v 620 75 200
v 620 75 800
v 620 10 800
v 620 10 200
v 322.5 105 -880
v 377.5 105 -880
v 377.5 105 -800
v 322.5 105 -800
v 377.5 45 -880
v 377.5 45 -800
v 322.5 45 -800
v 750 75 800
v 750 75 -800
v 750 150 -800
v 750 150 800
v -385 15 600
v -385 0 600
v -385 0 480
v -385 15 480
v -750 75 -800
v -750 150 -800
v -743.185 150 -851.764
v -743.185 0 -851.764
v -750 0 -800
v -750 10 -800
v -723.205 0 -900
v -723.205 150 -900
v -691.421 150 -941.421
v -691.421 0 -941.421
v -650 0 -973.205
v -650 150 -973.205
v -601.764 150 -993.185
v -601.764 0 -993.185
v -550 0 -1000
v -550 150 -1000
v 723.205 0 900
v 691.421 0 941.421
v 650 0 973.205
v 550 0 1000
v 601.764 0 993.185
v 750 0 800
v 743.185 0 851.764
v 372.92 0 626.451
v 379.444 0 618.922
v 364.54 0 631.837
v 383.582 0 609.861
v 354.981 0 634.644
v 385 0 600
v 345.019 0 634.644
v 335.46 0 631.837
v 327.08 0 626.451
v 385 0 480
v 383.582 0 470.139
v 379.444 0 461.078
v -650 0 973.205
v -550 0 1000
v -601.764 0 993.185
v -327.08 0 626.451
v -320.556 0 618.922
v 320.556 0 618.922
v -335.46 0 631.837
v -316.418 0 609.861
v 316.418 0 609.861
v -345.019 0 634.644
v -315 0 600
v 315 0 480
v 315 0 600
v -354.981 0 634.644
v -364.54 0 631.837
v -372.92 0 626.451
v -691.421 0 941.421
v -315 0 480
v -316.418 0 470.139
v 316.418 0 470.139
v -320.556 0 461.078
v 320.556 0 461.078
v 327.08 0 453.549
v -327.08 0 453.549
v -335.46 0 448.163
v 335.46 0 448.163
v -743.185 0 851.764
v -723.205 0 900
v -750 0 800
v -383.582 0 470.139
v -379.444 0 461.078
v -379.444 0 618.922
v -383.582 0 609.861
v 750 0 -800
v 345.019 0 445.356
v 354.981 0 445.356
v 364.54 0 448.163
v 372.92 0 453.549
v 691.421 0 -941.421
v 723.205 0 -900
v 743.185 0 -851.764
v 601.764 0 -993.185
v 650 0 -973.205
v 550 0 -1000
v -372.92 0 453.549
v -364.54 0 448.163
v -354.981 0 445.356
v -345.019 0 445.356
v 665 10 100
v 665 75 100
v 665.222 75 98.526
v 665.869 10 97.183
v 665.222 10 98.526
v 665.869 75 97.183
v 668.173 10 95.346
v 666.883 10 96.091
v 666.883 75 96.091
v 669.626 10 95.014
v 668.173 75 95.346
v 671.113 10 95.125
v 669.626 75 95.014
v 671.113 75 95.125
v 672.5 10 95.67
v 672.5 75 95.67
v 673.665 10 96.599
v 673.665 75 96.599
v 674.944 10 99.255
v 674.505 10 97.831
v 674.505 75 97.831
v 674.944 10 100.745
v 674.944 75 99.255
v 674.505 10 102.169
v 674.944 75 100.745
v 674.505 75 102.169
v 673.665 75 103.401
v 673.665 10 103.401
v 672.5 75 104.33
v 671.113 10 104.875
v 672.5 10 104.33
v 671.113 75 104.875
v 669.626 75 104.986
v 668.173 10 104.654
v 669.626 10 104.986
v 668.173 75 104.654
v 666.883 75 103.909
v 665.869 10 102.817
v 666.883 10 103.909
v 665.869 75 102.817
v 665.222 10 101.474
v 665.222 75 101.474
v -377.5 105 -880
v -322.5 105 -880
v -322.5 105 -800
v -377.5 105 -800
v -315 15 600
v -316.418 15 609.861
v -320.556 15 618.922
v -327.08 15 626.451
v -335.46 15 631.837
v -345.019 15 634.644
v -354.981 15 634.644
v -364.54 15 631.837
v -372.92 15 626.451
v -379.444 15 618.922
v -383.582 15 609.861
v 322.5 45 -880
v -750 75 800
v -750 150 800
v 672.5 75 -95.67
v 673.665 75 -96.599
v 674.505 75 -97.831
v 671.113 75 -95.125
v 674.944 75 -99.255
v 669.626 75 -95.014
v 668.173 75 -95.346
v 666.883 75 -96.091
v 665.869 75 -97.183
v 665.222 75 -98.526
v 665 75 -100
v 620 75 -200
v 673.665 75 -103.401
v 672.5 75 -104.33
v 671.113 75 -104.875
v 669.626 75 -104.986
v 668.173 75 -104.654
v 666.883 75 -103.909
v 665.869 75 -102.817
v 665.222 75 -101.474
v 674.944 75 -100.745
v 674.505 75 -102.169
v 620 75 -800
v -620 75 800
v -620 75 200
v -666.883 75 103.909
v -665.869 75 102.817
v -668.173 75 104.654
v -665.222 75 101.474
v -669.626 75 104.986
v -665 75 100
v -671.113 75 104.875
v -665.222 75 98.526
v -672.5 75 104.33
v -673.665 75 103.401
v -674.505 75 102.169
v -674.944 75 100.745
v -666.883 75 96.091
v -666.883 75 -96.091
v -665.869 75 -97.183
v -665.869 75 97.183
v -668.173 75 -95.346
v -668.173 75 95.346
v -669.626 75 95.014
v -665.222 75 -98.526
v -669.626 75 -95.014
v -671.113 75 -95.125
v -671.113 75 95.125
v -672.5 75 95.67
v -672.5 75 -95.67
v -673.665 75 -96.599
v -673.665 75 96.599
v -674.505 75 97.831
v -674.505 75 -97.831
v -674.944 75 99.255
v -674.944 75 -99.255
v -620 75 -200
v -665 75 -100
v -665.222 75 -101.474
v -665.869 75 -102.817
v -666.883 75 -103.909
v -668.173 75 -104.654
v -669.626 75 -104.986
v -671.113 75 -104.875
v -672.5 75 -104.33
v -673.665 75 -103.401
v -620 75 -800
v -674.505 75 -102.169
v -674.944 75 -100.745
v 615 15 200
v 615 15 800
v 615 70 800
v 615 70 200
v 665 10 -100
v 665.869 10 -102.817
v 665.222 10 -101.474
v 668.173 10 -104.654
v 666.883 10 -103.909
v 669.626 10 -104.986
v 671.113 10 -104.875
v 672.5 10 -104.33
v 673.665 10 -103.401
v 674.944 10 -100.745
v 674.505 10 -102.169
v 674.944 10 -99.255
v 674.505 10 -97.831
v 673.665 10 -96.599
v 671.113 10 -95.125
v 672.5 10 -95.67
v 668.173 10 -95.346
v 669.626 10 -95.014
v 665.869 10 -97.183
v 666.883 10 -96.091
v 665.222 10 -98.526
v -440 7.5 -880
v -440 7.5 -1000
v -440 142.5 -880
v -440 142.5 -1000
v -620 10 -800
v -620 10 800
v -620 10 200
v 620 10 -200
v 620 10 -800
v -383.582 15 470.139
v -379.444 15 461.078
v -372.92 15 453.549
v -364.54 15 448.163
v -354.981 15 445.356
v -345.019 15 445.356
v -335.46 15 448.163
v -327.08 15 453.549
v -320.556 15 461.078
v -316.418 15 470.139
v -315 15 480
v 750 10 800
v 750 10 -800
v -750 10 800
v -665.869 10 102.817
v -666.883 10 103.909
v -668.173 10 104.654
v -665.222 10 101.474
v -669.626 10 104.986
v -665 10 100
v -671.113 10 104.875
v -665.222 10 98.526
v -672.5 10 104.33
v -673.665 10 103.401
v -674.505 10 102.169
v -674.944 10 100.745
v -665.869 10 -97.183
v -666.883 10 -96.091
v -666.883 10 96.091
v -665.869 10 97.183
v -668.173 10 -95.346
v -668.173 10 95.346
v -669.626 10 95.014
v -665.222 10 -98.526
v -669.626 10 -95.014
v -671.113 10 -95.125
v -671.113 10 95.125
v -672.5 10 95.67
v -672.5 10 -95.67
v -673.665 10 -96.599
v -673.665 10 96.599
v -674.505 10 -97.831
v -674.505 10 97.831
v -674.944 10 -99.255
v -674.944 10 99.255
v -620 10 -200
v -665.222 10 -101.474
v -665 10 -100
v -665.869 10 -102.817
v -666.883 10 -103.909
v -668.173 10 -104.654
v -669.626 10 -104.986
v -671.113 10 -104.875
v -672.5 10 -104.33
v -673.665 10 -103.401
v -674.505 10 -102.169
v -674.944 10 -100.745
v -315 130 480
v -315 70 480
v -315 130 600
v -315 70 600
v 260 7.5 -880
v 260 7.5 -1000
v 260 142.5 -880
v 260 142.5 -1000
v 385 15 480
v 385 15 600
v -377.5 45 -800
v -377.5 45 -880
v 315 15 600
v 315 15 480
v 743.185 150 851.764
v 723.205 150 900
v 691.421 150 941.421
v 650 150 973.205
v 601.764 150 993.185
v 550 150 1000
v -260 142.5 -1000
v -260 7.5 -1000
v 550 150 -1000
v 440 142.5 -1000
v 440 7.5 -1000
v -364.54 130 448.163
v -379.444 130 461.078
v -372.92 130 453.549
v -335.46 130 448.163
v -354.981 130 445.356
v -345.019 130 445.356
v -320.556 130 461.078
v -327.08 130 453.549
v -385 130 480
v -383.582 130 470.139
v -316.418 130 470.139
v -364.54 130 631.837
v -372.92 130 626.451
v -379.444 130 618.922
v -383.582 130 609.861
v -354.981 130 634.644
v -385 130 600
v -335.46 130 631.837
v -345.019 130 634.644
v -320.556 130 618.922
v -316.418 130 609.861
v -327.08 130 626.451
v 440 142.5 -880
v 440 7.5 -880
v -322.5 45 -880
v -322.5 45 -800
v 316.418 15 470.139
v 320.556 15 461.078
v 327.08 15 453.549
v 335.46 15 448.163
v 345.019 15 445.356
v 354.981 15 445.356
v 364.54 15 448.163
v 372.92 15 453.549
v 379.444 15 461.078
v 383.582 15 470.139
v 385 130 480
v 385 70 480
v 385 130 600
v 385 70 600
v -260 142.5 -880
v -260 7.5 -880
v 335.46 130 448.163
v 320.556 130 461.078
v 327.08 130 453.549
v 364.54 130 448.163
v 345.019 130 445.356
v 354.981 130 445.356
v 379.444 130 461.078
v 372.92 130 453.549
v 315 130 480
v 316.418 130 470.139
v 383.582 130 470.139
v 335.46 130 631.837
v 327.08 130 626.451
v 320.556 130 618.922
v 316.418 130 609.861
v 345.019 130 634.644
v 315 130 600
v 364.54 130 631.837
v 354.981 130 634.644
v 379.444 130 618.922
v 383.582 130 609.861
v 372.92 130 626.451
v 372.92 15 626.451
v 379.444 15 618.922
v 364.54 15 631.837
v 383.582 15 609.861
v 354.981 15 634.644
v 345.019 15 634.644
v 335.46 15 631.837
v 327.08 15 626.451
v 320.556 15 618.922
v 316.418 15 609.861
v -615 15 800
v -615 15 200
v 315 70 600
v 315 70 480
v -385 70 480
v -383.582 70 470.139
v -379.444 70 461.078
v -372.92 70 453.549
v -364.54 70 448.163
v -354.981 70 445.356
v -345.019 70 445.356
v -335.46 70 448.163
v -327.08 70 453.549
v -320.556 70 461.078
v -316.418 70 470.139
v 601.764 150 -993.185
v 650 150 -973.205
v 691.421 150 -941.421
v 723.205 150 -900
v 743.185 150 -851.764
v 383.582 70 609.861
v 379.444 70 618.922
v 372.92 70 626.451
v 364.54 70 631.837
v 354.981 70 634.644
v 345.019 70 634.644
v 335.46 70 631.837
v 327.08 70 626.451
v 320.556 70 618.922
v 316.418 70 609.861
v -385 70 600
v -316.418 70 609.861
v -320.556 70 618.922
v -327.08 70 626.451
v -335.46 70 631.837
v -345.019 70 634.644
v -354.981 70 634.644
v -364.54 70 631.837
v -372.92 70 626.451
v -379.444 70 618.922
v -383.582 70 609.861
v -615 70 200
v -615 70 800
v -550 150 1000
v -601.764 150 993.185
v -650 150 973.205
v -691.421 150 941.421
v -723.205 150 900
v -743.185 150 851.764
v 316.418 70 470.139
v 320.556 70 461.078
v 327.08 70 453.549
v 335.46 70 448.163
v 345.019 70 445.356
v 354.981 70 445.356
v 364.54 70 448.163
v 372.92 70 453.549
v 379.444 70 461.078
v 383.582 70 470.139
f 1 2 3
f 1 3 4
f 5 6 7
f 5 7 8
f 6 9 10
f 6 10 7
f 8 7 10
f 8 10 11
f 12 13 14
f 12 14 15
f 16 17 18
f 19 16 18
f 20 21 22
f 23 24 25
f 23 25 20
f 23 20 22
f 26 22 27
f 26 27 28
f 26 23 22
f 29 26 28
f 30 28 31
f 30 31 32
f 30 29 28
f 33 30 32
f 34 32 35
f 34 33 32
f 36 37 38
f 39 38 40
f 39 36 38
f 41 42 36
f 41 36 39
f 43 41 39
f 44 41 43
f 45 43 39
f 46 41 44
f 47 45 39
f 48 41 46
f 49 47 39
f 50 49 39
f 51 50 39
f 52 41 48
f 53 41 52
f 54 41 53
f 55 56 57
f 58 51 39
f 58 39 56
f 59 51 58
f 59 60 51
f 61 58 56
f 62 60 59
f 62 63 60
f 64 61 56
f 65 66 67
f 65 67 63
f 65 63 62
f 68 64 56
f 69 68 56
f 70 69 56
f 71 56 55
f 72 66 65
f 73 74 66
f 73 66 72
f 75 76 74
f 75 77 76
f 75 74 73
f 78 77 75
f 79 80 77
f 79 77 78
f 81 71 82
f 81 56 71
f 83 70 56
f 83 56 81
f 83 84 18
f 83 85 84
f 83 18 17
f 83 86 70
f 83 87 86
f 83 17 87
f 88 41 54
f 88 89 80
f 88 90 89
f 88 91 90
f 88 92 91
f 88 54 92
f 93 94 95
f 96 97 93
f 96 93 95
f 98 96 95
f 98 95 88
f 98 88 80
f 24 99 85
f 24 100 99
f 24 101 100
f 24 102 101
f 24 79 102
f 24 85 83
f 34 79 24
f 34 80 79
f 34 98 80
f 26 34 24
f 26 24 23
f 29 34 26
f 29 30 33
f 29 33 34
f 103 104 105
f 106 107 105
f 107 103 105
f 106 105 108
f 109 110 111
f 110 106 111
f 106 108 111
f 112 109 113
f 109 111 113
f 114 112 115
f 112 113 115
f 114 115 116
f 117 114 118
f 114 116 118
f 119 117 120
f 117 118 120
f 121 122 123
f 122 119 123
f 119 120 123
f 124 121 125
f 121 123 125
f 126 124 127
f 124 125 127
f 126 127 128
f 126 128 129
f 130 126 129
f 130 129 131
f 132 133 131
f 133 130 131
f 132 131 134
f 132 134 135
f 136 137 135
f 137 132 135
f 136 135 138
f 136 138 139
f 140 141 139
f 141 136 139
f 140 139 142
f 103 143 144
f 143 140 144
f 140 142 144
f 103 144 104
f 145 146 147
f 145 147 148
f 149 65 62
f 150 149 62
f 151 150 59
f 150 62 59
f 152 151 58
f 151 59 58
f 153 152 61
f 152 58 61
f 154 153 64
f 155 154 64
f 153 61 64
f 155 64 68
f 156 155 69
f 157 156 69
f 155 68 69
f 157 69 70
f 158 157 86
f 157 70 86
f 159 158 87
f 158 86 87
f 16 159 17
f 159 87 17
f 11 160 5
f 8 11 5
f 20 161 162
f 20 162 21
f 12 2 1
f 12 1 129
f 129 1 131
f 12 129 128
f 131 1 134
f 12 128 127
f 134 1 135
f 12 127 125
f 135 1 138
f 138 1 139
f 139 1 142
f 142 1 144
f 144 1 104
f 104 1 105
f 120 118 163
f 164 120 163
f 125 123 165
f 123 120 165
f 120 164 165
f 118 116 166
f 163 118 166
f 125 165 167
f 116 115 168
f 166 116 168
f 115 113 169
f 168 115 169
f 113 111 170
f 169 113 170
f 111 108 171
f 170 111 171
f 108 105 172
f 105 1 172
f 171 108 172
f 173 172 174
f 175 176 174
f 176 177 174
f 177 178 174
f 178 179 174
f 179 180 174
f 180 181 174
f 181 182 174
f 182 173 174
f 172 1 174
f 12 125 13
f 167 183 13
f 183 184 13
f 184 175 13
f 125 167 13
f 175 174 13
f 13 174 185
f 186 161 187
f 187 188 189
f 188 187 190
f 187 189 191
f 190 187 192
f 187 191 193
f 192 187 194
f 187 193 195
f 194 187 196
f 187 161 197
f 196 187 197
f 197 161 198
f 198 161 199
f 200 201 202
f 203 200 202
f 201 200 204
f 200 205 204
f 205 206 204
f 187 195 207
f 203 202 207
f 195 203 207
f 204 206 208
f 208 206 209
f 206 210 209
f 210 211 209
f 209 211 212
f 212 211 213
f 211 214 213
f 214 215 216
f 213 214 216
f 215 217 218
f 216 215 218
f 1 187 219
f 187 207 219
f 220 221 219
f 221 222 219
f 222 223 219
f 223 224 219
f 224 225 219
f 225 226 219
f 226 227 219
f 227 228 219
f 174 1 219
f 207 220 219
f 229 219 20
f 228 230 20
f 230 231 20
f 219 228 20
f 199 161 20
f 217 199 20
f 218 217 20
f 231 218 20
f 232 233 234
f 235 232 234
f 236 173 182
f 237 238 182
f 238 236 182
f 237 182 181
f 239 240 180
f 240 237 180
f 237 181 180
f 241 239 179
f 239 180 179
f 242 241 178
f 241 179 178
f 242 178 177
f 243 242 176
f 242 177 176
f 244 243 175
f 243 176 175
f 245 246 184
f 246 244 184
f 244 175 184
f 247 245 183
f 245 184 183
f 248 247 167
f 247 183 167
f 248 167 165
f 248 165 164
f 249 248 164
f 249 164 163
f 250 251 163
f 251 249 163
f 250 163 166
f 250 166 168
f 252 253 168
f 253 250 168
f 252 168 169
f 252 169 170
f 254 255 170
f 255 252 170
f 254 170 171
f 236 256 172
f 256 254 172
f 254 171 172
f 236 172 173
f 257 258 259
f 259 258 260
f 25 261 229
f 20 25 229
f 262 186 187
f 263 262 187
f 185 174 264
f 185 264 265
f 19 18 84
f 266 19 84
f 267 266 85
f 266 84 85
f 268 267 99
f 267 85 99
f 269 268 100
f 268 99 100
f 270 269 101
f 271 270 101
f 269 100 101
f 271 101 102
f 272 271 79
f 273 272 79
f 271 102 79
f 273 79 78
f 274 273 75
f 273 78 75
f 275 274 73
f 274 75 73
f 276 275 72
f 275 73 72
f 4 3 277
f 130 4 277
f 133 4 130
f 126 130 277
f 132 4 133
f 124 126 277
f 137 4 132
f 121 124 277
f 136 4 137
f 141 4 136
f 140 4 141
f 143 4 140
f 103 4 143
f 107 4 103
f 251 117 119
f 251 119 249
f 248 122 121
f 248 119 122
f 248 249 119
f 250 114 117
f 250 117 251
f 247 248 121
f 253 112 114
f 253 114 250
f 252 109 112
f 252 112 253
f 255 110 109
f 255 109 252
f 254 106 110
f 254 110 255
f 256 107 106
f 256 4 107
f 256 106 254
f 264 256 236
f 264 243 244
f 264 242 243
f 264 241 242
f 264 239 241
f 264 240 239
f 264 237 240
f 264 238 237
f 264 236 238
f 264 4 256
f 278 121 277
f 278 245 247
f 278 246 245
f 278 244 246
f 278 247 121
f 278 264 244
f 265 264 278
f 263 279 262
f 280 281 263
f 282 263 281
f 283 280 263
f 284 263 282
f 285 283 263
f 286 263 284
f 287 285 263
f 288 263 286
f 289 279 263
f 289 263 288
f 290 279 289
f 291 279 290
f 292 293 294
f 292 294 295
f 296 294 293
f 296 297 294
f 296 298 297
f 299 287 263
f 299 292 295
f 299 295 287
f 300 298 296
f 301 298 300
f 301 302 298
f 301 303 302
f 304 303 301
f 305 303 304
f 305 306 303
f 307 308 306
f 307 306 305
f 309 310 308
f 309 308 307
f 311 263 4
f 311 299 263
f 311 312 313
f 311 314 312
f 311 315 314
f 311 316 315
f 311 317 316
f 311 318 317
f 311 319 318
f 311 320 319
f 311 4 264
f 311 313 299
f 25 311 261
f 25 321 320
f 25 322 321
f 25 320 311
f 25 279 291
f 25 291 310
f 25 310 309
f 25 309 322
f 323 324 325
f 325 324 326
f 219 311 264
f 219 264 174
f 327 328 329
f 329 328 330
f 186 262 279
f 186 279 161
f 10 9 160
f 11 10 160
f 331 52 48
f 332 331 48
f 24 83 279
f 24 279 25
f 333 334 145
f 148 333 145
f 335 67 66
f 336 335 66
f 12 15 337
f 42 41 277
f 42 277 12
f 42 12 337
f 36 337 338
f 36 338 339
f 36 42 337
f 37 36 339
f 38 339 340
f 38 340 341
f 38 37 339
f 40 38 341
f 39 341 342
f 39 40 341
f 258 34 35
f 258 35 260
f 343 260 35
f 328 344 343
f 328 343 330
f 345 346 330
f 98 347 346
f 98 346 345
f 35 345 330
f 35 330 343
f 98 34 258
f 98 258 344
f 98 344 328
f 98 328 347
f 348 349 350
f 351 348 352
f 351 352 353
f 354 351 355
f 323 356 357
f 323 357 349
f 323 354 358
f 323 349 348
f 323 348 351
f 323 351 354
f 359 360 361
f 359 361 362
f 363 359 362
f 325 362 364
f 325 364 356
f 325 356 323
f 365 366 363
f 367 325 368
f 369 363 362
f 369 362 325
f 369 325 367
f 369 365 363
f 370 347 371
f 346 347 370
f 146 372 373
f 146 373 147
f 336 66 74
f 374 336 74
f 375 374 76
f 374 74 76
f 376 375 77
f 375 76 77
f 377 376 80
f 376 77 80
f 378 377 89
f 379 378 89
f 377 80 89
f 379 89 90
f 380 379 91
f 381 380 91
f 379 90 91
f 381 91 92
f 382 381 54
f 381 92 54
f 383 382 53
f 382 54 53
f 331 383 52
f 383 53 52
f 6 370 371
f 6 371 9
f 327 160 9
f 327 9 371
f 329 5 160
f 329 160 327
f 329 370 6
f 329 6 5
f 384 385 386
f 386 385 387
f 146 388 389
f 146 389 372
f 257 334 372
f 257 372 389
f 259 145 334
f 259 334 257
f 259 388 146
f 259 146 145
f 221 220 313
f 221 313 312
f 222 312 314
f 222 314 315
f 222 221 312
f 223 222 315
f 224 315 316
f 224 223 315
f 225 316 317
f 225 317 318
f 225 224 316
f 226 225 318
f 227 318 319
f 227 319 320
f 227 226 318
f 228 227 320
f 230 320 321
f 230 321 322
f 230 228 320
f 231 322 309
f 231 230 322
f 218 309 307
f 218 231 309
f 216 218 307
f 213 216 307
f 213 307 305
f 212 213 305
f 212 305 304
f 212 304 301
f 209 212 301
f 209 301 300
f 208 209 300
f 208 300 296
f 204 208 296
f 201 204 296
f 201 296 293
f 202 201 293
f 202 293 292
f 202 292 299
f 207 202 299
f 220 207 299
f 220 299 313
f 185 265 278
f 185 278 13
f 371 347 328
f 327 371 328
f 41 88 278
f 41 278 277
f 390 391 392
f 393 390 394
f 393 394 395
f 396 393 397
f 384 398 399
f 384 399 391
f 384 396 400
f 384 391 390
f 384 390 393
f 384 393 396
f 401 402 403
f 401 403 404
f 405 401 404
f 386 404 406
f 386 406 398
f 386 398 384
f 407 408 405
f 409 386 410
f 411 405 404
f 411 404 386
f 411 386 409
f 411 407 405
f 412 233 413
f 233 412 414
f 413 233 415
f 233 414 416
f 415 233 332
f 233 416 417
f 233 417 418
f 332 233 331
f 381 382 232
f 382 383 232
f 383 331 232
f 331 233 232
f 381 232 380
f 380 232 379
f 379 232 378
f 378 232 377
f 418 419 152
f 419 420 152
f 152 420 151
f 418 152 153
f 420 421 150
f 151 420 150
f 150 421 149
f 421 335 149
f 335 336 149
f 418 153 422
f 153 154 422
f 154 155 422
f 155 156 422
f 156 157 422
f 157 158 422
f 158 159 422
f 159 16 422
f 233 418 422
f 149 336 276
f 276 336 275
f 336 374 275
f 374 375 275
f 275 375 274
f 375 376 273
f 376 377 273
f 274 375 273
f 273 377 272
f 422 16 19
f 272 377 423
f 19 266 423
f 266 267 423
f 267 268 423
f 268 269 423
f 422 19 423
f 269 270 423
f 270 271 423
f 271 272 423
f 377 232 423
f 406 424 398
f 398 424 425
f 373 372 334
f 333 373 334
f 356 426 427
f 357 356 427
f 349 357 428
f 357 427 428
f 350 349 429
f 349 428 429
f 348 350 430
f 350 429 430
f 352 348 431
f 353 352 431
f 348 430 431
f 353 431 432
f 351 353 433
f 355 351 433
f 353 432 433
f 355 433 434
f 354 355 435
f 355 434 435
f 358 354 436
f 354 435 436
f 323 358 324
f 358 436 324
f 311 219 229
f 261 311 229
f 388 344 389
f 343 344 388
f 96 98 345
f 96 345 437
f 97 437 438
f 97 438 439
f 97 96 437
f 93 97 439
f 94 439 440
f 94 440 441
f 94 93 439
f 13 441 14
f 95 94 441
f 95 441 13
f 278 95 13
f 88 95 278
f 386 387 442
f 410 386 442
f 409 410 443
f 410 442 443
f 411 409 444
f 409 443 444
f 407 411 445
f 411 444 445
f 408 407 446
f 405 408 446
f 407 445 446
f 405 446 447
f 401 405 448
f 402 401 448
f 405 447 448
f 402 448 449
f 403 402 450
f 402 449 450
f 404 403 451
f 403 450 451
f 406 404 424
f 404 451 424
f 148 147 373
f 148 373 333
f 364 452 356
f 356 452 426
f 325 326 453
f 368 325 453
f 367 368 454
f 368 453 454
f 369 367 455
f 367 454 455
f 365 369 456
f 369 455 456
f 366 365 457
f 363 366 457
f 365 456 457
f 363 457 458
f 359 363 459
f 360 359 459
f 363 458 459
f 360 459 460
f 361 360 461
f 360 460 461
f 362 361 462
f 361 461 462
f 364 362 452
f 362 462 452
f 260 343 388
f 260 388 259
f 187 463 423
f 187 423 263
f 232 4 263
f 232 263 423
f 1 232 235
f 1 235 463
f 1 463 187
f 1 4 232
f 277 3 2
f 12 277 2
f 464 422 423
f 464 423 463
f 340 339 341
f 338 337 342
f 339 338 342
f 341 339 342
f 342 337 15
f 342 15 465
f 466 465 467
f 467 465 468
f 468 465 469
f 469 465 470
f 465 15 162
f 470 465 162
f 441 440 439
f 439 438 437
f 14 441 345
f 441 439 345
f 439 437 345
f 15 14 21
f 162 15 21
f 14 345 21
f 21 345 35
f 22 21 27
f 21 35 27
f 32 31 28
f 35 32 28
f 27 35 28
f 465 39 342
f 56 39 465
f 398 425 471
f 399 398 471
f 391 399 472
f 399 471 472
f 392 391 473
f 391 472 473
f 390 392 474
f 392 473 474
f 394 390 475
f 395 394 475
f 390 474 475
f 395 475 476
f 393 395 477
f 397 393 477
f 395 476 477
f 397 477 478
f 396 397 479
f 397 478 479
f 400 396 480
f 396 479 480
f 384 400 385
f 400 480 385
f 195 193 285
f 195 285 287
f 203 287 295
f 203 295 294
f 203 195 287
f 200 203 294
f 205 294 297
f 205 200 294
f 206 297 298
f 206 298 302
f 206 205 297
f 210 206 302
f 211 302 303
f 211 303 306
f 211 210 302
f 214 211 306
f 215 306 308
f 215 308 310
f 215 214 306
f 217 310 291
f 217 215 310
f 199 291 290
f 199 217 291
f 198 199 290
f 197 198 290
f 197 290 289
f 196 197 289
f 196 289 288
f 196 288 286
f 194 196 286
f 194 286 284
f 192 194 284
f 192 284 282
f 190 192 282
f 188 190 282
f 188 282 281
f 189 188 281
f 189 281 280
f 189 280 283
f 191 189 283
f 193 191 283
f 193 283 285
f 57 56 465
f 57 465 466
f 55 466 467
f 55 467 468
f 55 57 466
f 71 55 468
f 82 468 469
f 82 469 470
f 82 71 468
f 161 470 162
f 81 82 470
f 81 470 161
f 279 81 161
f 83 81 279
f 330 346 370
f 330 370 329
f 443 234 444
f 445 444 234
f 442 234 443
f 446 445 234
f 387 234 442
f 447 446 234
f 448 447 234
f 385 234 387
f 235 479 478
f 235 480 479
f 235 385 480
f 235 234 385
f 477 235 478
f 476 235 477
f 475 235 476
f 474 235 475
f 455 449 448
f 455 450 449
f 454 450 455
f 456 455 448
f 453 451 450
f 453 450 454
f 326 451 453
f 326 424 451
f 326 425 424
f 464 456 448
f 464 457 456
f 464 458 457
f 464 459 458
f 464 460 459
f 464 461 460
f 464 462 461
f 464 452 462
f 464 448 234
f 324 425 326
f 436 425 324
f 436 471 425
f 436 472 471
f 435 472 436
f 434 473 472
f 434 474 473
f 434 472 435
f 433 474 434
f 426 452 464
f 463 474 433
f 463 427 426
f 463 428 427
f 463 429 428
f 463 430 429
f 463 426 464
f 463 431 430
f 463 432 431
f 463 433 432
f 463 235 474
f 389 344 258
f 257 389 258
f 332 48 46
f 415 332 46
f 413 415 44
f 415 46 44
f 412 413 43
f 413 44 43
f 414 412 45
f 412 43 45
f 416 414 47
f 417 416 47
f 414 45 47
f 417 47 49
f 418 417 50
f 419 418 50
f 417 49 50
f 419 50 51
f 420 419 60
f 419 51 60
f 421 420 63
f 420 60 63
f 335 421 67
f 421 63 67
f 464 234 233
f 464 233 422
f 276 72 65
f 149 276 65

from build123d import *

# Parameters (mm, degrees)
BOSS_EXTRUDE1_DEPTH     = 150
SKETCH2_W               = 400
SKETCH2_H               = 65
CUT_EXTRUDE1_DEPTH      = 1
CUT_EXTRUDE1_DEPTH_BACK = 1501
SKETCH3_W               = 600
SKETCH3_H               = 65
CUT_EXTRUDE2_DEPTH      = 130
SKETCH4_R               = 5
BOSS_EXTRUDE2_DEPTH     = 150
SKETCH6_W               = 55
SKETCH6_H               = 60
CUT_EXTRUDE4_DEPTH      = 200
CUT_EXTRUDE5_DEPTH      = 130
SKETCH8_W               = 1230
SKETCH8_H               = 55
CUT_EXTRUDE6_DEPTH      = 600
SKETCH9_W               = 180
SKETCH9_H               = 135
CUT_EXTRUDE7_DEPTH      = 120


with BuildPart() as part:
    # Sketch1 → Boss-Extrude1 (new body)
    with BuildSketch(Plane(origin=(0, 0, 0), x_dir=(1, 0, 0), z_dir=(0, 1, 0))):
        with BuildLine():
            Line((-550, 1000), (-225, 1000))
            Line((-225, 1000), (225, 1000))
            Line((225, 1000), (550, 1000))
            ThreePointArc((550, 1000), (691.421356237, 941.421356237), (750, 800))
            Line((750, 800), (750, -800))
            ThreePointArc((750, -800), (691.421356237, -941.421356237), (550, -1000))
            Line((550, -1000), (-550, -1000))
            ThreePointArc((-550, -1000), (-691.421356237, -941.421356237), (-750, -800))
            Line((-750, -800), (-750, 800))
            ThreePointArc((-750, 800), (-691.421356237, 941.421356237), (-550, 1000))
        make_face()
    extrude(amount=BOSS_EXTRUDE1_DEPTH)

    # Sketch2 → Cut-Extrude1 (cut, two sides)
    with BuildSketch(Plane(origin=(750, 0, 0), x_dir=(0, 0, -1), z_dir=(1, 0, 0))) as cut_extrude1_sk:
        with Locations((0, 42.5)):
            Rectangle(SKETCH2_W, SKETCH2_H)
    extrude(amount=CUT_EXTRUDE1_DEPTH, mode=Mode.SUBTRACT)
    extrude(cut_extrude1_sk.sketch, amount=-CUT_EXTRUDE1_DEPTH_BACK, mode=Mode.SUBTRACT)

    # Sketch3 → Cut-Extrude2 (cut)
    with BuildSketch(Plane(origin=(750, 0, 0), x_dir=(0, 0, -1), z_dir=(1, 0, 0))):
        with Locations((500, 42.5)):
            Rectangle(SKETCH3_W, SKETCH3_H)
        with Locations((-500, 42.5)):
            Rectangle(SKETCH3_W, SKETCH3_H)
    cut_extrude2 = extrude(amount=-CUT_EXTRUDE2_DEPTH, mode=Mode.SUBTRACT)

    # Mirror1: Cut-Extrude2 across plane
    add(cut_extrude2.mirror(Plane(origin=(0, 0, 0), x_dir=(0, 0, 1), z_dir=(1, 0, 0))), mode=Mode.SUBTRACT)

    # Sketch4 → Boss-Extrude2 (add)
    with BuildSketch(Plane(origin=(0, 150, 0), x_dir=(1, 0, 0), z_dir=(0, 1, 0))):
        with Locations((-670, 100)):
            Circle(SKETCH4_R)
        with Locations((-670, -100)):
            Circle(SKETCH4_R)
    boss_extrude2 = extrude(amount=-BOSS_EXTRUDE2_DEPTH)

    # Mirror2: Boss-Extrude2 across plane
    add(boss_extrude2.mirror(Plane(origin=(0, 0, 0), x_dir=(0, 0, 1), z_dir=(1, 0, 0))))

    # Sketch6 → Cut-Extrude4 (cut)
    with BuildSketch(Plane(origin=(0, 0, -1000), x_dir=(-1, 0, 0), z_dir=(0, 0, -1))):
        with Locations((-350, 75)):
            Rectangle(SKETCH6_W, SKETCH6_H)
        with Locations((350, 75)):
            Rectangle(SKETCH6_W, SKETCH6_H)
    extrude(amount=-CUT_EXTRUDE4_DEPTH, mode=Mode.SUBTRACT)

    # Sketch7 → Cut-Extrude5 (cut)
    with BuildSketch(Plane.XZ):
        with BuildLine():
            Line((385, 480), (385, 600))
            ThreePointArc((385, 600), (350, 635), (315, 600))
            Line((315, 600), (315, 480))
            ThreePointArc((315, 480), (350, 445), (385, 480))
        make_face()
        with BuildLine():
            Line((-315, 480), (-315, 600))
            ThreePointArc((-315, 600), (-350, 635), (-385, 600))
            Line((-385, 600), (-385, 480))
            ThreePointArc((-385, 480), (-350, 445), (-315, 480))
        make_face()
    extrude(amount=-CUT_EXTRUDE5_DEPTH, mode=Mode.SUBTRACT)

    # Sketch8 → Cut-Extrude6 (cut)
    with BuildSketch(Plane(origin=(0, 0, 200), x_dir=(-1, 0, 0), z_dir=(0, 0, -1))):
        with Locations((0, 42.5)):
            Rectangle(SKETCH8_W, SKETCH8_H)
    extrude(amount=-CUT_EXTRUDE6_DEPTH, mode=Mode.SUBTRACT)

    # Sketch9 → Cut-Extrude7 (cut)
    with BuildSketch(Plane(origin=(0, 0, -1000), x_dir=(-1, 0, 0), z_dir=(0, 0, -1))):
        with Locations((-350, 75)):
            Rectangle(SKETCH9_W, SKETCH9_H)
        with Locations((350, 75)):
            Rectangle(SKETCH9_W, SKETCH9_H)
    extrude(amount=-CUT_EXTRUDE7_DEPTH, mode=Mode.SUBTRACT)


solid = part.part
